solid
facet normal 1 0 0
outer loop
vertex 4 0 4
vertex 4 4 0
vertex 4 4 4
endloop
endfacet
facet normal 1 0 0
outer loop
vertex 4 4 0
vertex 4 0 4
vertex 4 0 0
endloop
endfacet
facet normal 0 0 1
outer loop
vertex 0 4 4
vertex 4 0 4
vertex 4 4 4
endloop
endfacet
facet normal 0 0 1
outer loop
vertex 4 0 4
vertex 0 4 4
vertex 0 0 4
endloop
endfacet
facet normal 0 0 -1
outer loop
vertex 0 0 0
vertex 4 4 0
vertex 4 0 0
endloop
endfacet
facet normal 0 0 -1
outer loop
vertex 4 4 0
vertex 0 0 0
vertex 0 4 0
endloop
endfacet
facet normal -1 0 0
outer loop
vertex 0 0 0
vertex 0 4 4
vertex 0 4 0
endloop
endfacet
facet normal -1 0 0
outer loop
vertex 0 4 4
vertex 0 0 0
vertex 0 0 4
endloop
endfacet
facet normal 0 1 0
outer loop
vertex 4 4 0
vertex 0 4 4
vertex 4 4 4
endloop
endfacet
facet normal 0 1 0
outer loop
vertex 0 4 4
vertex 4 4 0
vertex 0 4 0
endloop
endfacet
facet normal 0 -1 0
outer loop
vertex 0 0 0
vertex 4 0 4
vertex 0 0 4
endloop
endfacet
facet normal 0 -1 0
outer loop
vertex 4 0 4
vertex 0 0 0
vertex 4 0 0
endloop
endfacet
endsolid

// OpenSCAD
/*

Sage Ridge Robotics OpenSCAD file.
Christopher von Nagy, July 2014.

Example 01 cubes.



*/

// Cubes
// Rectangular solids are constructed with the cube command.
// We use translate to position the solid. Note how the *entire line*
// ends with a semi-colon.

translate([0,0,0]) cube(4,4,4);
translate([2,2,2]) cube(4,4,4, center=true);

// Use your mouse in the visualization pane to rotate the view
// around. See what happens when you change
// center=true to center=false in the second cube.

// What happens if you remove the translate() command? Where do
// objects draw by default?


/*

License code:

Creative Commons Atribution 4.0

Attribution — You must give appropriate credit, provide a link to the license, and indicate if changes were made. You may do so in any reasonable manner, but not in any way that suggests the licensor endorses you or your use.

No additional restrictions — You may not apply legal terms or technological measures that legally restrict others from doing anything the license permits.


*/
